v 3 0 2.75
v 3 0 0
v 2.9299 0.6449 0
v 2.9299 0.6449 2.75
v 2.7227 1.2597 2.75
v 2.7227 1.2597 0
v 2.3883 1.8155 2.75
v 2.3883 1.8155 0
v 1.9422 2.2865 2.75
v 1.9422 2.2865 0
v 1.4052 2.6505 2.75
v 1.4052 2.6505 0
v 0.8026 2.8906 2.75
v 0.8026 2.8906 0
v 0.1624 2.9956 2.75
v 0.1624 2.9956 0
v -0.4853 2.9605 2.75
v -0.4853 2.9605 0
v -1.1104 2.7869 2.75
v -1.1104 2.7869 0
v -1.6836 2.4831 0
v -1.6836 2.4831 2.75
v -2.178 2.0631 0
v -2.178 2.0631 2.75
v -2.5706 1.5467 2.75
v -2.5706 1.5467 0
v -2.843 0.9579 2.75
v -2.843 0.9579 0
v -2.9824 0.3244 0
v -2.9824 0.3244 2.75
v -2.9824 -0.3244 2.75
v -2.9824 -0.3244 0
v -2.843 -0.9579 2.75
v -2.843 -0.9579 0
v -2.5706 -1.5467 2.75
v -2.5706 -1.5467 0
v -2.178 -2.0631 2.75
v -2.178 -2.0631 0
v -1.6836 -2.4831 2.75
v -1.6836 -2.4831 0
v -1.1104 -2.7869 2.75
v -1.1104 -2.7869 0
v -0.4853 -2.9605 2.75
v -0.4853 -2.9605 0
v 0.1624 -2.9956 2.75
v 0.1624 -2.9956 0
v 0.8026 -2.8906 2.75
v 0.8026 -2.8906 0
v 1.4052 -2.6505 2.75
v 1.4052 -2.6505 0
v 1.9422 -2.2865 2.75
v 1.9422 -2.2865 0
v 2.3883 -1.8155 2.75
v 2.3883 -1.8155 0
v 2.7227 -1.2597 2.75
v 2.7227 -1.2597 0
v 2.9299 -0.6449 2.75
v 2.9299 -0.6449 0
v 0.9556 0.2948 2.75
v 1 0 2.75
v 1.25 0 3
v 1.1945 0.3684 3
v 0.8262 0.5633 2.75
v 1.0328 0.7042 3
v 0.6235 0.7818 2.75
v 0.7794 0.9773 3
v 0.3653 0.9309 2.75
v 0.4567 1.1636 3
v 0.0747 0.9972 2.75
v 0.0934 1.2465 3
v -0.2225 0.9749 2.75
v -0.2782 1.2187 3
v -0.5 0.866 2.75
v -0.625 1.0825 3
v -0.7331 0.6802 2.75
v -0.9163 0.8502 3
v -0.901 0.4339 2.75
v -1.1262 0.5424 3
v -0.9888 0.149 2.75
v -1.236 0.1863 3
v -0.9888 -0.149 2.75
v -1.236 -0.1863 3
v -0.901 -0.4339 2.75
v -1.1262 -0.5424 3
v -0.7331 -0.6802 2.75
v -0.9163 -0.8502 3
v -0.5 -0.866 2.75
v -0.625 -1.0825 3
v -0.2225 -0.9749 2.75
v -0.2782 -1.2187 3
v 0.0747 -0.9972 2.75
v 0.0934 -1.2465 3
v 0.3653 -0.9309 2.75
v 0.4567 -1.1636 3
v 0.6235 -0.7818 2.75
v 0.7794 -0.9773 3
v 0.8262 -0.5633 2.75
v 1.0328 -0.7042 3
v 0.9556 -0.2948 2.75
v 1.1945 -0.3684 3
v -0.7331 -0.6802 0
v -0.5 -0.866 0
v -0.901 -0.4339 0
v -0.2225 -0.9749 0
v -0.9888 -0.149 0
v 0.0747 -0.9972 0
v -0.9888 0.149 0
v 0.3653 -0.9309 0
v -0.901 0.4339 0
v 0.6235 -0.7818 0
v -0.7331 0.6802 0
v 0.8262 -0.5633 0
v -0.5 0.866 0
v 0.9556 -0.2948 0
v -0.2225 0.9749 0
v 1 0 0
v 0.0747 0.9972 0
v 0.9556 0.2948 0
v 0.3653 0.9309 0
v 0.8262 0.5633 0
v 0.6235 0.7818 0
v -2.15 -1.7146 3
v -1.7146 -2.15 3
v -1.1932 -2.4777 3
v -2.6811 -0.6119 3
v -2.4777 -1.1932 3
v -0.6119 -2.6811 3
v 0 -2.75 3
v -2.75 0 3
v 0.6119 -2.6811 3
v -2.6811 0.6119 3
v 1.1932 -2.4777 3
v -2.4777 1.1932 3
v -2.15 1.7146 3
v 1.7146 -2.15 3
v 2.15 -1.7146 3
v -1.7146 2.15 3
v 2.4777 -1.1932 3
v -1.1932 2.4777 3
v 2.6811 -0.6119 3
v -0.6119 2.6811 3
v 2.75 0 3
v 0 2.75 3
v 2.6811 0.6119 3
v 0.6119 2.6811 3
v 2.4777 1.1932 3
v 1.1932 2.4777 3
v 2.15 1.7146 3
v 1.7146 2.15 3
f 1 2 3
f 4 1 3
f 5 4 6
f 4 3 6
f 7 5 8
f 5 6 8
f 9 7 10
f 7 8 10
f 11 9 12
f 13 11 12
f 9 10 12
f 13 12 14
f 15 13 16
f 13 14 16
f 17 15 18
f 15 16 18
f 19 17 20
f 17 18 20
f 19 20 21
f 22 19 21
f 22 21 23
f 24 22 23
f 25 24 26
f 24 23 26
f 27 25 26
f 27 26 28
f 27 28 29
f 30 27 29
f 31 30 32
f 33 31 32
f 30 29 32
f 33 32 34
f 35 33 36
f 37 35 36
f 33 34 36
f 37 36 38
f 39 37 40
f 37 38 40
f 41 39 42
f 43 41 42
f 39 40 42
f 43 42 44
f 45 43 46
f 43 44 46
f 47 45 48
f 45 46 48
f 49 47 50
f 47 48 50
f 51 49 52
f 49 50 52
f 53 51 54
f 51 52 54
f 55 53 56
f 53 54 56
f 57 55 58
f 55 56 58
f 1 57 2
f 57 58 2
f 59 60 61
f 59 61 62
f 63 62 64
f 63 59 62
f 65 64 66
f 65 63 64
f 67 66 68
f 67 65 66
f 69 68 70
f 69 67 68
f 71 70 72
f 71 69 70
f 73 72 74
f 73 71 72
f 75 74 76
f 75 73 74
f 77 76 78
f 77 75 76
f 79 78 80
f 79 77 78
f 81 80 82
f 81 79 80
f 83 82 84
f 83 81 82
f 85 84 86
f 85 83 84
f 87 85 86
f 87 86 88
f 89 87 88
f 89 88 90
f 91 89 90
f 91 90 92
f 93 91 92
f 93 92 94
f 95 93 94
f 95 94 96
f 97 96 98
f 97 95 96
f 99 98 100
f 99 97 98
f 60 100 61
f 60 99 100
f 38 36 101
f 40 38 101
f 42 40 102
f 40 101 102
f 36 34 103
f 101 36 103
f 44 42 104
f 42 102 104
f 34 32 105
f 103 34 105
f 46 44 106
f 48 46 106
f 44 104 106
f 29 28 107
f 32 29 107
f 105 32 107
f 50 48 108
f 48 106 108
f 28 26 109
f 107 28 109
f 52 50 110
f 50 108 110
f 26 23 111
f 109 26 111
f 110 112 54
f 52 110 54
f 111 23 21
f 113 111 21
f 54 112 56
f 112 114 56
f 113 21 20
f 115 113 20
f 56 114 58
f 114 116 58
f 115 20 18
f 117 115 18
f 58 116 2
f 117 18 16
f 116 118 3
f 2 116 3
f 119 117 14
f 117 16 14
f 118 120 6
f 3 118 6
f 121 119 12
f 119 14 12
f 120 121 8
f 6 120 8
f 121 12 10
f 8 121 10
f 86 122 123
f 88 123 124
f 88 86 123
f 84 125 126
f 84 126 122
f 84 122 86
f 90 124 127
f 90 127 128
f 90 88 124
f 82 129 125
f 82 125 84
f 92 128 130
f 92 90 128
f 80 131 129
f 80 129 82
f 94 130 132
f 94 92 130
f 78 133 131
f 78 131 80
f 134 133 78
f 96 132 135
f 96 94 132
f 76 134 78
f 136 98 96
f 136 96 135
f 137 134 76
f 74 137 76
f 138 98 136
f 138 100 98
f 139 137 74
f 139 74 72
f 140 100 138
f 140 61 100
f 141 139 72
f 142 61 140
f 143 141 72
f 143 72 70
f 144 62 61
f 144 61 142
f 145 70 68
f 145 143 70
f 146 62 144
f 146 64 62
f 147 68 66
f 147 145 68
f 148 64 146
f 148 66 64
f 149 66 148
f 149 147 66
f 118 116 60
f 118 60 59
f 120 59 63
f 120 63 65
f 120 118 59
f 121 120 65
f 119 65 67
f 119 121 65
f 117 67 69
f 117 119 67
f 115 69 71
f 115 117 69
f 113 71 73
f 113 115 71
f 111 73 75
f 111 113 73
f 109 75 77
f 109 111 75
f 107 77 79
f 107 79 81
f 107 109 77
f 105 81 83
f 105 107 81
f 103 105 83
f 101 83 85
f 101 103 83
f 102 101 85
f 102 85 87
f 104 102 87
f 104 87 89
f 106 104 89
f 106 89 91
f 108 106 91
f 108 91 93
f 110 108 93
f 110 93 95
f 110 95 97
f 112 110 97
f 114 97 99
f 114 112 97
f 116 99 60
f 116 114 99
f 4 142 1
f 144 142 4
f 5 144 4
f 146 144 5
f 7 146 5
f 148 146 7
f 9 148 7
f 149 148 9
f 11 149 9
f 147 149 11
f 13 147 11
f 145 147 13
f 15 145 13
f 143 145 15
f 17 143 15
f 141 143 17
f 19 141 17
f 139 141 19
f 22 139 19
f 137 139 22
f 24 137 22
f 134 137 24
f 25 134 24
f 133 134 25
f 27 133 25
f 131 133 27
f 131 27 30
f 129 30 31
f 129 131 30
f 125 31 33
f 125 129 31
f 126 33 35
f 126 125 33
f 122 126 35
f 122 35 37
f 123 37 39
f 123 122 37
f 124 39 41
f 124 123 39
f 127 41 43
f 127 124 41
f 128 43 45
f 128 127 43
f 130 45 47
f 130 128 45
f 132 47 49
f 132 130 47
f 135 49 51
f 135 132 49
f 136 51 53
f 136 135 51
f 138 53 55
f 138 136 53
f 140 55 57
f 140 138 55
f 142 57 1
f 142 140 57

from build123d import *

# Parameters (mm, degrees)
SKETCH1_R           = 3
SKETCH1_R_2         = 1
EXTRUDE_THIN1_DEPTH = 3
CHAMFER1_SIZE       = 0.25
CHAMFER2_SIZE       = 0.25


with BuildPart() as part:
    # Sketch1 → Extrude-Thin1 (new body)
    with BuildSketch(Plane.XY):
        Circle(SKETCH1_R)
        Circle(SKETCH1_R_2, mode=Mode.SUBTRACT)
    extrude(amount=EXTRUDE_THIN1_DEPTH)

    # Chamfer1
    chamfer1_edges = [part.edges().sort_by_distance(p)[0] for p in [
        (-3, 0, 3),
    ]]
    chamfer(chamfer1_edges, length=CHAMFER1_SIZE)

    # Chamfer2
    chamfer2_edges = [part.edges().sort_by_distance(p)[0] for p in [
        (-1, 0, 3),
    ]]
    chamfer(chamfer2_edges, length=CHAMFER2_SIZE)


solid = part.part
